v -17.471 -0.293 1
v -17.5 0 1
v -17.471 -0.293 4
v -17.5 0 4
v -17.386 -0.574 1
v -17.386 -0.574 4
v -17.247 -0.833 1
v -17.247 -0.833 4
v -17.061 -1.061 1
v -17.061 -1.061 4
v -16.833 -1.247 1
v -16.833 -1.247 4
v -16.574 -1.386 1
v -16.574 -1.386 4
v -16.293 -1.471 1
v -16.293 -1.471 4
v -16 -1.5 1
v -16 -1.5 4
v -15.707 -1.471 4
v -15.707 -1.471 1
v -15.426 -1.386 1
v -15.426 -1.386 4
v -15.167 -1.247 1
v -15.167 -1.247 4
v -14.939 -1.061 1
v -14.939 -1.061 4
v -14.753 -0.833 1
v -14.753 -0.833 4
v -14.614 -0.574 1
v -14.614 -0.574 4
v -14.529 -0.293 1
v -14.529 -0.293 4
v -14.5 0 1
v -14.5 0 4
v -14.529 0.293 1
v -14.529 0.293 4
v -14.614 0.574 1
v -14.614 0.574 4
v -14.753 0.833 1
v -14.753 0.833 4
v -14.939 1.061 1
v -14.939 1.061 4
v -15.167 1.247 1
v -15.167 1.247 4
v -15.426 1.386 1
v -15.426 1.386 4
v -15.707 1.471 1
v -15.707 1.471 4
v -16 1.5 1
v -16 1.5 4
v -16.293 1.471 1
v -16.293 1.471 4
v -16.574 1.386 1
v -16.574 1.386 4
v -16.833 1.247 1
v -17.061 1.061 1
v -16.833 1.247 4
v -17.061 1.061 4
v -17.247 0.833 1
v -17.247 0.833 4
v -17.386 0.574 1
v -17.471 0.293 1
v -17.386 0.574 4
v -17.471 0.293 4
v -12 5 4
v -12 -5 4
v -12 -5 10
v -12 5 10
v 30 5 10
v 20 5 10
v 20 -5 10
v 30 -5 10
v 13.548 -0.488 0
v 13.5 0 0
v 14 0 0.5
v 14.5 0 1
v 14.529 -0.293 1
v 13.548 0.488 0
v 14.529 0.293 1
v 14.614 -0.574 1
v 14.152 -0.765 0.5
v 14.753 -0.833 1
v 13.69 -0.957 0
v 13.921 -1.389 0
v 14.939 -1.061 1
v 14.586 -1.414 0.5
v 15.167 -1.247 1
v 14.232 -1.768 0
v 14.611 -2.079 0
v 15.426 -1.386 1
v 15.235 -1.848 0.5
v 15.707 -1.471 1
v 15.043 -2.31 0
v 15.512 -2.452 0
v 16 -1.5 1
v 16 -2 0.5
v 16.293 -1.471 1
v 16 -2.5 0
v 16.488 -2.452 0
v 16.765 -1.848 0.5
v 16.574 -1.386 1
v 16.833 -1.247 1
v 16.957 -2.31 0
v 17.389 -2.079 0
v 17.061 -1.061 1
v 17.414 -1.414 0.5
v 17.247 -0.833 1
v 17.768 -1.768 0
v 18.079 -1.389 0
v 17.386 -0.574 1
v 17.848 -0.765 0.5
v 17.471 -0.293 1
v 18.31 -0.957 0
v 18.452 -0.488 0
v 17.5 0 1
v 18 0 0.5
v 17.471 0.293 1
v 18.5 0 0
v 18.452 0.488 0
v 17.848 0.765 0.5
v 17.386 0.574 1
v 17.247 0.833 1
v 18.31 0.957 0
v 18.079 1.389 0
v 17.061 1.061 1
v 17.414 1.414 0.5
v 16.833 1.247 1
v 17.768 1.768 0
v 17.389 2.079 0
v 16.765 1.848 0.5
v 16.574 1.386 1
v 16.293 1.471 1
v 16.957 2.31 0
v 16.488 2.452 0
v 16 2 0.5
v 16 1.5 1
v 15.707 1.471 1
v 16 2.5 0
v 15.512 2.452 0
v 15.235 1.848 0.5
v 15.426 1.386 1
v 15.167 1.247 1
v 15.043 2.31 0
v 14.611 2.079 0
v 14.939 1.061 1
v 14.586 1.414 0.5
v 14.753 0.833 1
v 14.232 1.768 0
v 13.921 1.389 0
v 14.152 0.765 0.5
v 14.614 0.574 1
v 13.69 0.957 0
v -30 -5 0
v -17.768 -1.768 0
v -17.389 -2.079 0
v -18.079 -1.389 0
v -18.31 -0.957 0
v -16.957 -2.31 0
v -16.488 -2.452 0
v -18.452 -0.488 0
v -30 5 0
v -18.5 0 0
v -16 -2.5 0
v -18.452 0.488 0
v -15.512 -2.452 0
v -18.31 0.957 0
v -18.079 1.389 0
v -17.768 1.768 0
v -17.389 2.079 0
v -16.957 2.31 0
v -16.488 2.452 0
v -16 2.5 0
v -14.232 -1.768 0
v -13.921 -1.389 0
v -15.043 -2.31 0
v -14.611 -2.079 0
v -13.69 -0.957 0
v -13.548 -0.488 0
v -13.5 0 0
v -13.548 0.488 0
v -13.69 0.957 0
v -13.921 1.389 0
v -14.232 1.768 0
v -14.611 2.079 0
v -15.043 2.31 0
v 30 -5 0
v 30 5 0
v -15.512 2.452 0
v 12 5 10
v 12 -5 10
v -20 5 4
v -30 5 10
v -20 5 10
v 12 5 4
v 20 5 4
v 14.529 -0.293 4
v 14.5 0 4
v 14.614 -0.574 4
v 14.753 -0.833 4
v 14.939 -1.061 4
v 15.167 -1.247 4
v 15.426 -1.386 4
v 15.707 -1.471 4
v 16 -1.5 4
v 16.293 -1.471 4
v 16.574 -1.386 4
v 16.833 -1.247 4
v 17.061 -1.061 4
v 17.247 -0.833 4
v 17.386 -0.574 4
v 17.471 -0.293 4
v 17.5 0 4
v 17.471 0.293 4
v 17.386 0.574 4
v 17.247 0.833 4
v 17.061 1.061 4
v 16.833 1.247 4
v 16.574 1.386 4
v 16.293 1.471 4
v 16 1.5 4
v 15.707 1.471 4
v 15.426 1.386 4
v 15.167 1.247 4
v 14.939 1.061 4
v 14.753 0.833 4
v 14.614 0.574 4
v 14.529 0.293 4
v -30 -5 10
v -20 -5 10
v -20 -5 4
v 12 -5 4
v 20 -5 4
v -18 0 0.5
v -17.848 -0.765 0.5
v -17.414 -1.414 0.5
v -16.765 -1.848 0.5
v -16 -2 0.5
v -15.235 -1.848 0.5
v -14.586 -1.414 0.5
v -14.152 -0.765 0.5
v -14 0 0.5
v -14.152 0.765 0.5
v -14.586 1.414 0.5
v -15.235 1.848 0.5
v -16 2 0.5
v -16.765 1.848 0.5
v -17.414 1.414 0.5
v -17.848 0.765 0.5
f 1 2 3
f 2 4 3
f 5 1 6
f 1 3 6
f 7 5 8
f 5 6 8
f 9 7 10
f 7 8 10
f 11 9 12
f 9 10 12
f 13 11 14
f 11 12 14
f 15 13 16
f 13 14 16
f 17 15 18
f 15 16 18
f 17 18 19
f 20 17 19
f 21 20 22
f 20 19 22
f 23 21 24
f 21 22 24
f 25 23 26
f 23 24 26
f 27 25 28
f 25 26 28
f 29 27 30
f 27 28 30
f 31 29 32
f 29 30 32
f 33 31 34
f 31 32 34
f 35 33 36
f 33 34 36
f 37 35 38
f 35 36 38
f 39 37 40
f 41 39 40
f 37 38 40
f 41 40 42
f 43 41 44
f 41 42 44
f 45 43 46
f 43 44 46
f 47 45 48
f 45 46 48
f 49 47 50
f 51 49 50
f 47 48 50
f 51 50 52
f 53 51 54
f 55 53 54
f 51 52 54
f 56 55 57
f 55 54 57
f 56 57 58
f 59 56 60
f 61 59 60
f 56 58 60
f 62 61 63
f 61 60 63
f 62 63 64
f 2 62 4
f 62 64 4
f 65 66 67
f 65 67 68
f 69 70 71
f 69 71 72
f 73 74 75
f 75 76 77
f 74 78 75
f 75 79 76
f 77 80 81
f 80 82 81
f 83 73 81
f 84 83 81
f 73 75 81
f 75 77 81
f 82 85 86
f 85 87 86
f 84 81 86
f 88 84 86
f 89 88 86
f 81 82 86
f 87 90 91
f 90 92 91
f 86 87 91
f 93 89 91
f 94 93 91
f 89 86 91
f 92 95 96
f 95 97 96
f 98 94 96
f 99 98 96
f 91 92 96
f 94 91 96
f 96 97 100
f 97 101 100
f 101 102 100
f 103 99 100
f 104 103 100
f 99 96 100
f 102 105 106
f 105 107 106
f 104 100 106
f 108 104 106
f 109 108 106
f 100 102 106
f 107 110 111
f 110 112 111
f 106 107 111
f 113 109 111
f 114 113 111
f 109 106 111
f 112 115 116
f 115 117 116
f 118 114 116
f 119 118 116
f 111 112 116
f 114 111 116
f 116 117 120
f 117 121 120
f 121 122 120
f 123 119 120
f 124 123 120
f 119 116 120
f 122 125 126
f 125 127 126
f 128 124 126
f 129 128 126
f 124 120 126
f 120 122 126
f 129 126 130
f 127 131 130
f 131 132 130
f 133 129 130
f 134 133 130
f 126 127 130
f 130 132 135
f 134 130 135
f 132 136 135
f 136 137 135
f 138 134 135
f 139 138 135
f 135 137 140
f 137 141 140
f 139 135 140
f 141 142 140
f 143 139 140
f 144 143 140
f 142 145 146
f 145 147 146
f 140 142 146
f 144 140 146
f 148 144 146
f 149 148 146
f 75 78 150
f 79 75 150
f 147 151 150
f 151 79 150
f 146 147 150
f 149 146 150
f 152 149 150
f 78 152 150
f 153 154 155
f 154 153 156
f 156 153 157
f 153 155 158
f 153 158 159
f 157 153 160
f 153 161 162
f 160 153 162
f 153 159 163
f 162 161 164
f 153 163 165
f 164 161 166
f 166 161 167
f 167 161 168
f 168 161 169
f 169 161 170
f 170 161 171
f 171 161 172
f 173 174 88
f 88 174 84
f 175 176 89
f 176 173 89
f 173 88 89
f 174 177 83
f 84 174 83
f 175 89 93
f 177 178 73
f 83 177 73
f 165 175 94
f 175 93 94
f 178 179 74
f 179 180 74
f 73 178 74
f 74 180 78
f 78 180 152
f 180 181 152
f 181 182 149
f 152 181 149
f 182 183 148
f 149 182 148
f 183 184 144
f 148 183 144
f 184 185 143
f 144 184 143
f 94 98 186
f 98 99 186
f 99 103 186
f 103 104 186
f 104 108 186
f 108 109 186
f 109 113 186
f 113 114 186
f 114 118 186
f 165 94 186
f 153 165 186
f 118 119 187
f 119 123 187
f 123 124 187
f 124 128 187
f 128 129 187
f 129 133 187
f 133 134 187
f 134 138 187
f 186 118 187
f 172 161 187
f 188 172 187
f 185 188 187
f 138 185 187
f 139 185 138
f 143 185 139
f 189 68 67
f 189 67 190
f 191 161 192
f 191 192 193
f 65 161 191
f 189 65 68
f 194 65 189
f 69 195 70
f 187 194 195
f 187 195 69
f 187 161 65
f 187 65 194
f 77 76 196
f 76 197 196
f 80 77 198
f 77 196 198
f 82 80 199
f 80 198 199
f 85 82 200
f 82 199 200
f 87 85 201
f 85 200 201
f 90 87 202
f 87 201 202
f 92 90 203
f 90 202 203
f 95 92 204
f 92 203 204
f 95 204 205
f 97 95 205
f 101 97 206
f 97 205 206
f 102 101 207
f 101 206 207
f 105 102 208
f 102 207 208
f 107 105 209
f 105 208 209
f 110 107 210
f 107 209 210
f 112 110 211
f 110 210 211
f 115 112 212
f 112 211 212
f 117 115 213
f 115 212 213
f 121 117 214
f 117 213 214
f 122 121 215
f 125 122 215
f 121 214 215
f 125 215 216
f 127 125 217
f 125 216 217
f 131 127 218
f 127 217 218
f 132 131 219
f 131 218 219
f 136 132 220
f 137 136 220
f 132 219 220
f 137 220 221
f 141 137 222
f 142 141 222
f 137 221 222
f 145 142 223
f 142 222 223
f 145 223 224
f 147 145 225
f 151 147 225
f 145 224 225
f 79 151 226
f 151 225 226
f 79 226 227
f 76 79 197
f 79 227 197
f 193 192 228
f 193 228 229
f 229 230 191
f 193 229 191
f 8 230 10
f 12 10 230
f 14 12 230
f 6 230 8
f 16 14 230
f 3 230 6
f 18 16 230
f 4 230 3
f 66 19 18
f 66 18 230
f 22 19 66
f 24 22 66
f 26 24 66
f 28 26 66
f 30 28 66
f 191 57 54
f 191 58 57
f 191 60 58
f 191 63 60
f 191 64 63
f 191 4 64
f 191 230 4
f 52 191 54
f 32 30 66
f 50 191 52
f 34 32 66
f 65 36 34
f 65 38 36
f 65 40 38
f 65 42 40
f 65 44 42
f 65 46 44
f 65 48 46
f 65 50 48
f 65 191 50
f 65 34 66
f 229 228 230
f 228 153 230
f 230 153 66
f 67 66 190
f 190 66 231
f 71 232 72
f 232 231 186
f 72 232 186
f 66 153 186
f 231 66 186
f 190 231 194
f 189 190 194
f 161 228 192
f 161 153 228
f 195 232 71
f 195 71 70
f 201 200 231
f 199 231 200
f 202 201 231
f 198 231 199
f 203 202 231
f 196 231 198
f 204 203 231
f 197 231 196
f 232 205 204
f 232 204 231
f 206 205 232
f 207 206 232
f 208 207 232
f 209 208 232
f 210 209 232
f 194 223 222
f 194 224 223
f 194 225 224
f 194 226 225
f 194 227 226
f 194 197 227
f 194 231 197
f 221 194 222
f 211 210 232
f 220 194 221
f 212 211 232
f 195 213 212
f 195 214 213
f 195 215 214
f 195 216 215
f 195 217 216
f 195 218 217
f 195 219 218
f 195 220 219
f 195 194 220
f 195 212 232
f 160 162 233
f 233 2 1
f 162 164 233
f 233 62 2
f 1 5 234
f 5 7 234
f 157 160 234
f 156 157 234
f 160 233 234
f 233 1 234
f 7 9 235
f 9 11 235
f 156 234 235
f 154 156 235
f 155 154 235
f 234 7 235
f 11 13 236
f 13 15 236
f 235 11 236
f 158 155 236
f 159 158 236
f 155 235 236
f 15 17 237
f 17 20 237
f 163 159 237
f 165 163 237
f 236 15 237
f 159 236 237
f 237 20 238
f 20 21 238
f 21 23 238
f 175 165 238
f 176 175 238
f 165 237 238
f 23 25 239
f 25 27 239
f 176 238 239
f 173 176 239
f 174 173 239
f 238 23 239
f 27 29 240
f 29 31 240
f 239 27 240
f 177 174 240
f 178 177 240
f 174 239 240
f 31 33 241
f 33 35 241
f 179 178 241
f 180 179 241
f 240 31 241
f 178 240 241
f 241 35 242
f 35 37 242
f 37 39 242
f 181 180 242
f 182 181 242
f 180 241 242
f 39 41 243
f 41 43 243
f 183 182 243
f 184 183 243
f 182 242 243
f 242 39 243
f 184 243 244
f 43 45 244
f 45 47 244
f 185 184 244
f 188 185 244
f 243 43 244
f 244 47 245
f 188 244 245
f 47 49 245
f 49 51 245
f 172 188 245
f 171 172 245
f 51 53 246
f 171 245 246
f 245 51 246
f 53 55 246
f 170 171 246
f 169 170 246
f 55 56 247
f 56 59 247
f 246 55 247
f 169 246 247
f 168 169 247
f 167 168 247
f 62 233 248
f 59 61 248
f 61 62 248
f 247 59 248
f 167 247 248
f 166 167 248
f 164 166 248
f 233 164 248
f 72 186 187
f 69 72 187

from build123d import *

# Parameters (mm, degrees)
F0_W           = 60
F0_H           = 10
F1_DEPTH       = 4
F2_W           = 10
F2_H           = 10
F2_W_2         = 24
F3_DEPTH       = 6
F5_D           = 3
F5_CSINK_D     = 5
F5_CSINK_ANGLE = 90


with BuildPart() as f1:
    # F0 (on Top) → F1 (new body)
    with BuildSketch(Plane.XY):
        Rectangle(F0_W, F0_H)
    extrude(amount=F1_DEPTH)

    # F2 (on face) → F3 (join)
    with BuildSketch(Plane.XY.offset(4)):
        with Locations((-25, 0)):
            Rectangle(F2_W, F2_H)
        Rectangle(F2_W_2, F2_H)
        with Locations((25, 0)):
            Rectangle(F2_W, F2_H)
    extrude(amount=F3_DEPTH)

    # F5 (through all)
    with Locations(Plane(origin=(0, 0, 0), x_dir=(1, 0, 0), z_dir=(0, 0, -1))):
        with Locations((-16, 0), (16, 0)):
            CounterSinkHole(F5_D / 2, F5_CSINK_D / 2, counter_sink_angle=F5_CSINK_ANGLE)


solid = f1.part
